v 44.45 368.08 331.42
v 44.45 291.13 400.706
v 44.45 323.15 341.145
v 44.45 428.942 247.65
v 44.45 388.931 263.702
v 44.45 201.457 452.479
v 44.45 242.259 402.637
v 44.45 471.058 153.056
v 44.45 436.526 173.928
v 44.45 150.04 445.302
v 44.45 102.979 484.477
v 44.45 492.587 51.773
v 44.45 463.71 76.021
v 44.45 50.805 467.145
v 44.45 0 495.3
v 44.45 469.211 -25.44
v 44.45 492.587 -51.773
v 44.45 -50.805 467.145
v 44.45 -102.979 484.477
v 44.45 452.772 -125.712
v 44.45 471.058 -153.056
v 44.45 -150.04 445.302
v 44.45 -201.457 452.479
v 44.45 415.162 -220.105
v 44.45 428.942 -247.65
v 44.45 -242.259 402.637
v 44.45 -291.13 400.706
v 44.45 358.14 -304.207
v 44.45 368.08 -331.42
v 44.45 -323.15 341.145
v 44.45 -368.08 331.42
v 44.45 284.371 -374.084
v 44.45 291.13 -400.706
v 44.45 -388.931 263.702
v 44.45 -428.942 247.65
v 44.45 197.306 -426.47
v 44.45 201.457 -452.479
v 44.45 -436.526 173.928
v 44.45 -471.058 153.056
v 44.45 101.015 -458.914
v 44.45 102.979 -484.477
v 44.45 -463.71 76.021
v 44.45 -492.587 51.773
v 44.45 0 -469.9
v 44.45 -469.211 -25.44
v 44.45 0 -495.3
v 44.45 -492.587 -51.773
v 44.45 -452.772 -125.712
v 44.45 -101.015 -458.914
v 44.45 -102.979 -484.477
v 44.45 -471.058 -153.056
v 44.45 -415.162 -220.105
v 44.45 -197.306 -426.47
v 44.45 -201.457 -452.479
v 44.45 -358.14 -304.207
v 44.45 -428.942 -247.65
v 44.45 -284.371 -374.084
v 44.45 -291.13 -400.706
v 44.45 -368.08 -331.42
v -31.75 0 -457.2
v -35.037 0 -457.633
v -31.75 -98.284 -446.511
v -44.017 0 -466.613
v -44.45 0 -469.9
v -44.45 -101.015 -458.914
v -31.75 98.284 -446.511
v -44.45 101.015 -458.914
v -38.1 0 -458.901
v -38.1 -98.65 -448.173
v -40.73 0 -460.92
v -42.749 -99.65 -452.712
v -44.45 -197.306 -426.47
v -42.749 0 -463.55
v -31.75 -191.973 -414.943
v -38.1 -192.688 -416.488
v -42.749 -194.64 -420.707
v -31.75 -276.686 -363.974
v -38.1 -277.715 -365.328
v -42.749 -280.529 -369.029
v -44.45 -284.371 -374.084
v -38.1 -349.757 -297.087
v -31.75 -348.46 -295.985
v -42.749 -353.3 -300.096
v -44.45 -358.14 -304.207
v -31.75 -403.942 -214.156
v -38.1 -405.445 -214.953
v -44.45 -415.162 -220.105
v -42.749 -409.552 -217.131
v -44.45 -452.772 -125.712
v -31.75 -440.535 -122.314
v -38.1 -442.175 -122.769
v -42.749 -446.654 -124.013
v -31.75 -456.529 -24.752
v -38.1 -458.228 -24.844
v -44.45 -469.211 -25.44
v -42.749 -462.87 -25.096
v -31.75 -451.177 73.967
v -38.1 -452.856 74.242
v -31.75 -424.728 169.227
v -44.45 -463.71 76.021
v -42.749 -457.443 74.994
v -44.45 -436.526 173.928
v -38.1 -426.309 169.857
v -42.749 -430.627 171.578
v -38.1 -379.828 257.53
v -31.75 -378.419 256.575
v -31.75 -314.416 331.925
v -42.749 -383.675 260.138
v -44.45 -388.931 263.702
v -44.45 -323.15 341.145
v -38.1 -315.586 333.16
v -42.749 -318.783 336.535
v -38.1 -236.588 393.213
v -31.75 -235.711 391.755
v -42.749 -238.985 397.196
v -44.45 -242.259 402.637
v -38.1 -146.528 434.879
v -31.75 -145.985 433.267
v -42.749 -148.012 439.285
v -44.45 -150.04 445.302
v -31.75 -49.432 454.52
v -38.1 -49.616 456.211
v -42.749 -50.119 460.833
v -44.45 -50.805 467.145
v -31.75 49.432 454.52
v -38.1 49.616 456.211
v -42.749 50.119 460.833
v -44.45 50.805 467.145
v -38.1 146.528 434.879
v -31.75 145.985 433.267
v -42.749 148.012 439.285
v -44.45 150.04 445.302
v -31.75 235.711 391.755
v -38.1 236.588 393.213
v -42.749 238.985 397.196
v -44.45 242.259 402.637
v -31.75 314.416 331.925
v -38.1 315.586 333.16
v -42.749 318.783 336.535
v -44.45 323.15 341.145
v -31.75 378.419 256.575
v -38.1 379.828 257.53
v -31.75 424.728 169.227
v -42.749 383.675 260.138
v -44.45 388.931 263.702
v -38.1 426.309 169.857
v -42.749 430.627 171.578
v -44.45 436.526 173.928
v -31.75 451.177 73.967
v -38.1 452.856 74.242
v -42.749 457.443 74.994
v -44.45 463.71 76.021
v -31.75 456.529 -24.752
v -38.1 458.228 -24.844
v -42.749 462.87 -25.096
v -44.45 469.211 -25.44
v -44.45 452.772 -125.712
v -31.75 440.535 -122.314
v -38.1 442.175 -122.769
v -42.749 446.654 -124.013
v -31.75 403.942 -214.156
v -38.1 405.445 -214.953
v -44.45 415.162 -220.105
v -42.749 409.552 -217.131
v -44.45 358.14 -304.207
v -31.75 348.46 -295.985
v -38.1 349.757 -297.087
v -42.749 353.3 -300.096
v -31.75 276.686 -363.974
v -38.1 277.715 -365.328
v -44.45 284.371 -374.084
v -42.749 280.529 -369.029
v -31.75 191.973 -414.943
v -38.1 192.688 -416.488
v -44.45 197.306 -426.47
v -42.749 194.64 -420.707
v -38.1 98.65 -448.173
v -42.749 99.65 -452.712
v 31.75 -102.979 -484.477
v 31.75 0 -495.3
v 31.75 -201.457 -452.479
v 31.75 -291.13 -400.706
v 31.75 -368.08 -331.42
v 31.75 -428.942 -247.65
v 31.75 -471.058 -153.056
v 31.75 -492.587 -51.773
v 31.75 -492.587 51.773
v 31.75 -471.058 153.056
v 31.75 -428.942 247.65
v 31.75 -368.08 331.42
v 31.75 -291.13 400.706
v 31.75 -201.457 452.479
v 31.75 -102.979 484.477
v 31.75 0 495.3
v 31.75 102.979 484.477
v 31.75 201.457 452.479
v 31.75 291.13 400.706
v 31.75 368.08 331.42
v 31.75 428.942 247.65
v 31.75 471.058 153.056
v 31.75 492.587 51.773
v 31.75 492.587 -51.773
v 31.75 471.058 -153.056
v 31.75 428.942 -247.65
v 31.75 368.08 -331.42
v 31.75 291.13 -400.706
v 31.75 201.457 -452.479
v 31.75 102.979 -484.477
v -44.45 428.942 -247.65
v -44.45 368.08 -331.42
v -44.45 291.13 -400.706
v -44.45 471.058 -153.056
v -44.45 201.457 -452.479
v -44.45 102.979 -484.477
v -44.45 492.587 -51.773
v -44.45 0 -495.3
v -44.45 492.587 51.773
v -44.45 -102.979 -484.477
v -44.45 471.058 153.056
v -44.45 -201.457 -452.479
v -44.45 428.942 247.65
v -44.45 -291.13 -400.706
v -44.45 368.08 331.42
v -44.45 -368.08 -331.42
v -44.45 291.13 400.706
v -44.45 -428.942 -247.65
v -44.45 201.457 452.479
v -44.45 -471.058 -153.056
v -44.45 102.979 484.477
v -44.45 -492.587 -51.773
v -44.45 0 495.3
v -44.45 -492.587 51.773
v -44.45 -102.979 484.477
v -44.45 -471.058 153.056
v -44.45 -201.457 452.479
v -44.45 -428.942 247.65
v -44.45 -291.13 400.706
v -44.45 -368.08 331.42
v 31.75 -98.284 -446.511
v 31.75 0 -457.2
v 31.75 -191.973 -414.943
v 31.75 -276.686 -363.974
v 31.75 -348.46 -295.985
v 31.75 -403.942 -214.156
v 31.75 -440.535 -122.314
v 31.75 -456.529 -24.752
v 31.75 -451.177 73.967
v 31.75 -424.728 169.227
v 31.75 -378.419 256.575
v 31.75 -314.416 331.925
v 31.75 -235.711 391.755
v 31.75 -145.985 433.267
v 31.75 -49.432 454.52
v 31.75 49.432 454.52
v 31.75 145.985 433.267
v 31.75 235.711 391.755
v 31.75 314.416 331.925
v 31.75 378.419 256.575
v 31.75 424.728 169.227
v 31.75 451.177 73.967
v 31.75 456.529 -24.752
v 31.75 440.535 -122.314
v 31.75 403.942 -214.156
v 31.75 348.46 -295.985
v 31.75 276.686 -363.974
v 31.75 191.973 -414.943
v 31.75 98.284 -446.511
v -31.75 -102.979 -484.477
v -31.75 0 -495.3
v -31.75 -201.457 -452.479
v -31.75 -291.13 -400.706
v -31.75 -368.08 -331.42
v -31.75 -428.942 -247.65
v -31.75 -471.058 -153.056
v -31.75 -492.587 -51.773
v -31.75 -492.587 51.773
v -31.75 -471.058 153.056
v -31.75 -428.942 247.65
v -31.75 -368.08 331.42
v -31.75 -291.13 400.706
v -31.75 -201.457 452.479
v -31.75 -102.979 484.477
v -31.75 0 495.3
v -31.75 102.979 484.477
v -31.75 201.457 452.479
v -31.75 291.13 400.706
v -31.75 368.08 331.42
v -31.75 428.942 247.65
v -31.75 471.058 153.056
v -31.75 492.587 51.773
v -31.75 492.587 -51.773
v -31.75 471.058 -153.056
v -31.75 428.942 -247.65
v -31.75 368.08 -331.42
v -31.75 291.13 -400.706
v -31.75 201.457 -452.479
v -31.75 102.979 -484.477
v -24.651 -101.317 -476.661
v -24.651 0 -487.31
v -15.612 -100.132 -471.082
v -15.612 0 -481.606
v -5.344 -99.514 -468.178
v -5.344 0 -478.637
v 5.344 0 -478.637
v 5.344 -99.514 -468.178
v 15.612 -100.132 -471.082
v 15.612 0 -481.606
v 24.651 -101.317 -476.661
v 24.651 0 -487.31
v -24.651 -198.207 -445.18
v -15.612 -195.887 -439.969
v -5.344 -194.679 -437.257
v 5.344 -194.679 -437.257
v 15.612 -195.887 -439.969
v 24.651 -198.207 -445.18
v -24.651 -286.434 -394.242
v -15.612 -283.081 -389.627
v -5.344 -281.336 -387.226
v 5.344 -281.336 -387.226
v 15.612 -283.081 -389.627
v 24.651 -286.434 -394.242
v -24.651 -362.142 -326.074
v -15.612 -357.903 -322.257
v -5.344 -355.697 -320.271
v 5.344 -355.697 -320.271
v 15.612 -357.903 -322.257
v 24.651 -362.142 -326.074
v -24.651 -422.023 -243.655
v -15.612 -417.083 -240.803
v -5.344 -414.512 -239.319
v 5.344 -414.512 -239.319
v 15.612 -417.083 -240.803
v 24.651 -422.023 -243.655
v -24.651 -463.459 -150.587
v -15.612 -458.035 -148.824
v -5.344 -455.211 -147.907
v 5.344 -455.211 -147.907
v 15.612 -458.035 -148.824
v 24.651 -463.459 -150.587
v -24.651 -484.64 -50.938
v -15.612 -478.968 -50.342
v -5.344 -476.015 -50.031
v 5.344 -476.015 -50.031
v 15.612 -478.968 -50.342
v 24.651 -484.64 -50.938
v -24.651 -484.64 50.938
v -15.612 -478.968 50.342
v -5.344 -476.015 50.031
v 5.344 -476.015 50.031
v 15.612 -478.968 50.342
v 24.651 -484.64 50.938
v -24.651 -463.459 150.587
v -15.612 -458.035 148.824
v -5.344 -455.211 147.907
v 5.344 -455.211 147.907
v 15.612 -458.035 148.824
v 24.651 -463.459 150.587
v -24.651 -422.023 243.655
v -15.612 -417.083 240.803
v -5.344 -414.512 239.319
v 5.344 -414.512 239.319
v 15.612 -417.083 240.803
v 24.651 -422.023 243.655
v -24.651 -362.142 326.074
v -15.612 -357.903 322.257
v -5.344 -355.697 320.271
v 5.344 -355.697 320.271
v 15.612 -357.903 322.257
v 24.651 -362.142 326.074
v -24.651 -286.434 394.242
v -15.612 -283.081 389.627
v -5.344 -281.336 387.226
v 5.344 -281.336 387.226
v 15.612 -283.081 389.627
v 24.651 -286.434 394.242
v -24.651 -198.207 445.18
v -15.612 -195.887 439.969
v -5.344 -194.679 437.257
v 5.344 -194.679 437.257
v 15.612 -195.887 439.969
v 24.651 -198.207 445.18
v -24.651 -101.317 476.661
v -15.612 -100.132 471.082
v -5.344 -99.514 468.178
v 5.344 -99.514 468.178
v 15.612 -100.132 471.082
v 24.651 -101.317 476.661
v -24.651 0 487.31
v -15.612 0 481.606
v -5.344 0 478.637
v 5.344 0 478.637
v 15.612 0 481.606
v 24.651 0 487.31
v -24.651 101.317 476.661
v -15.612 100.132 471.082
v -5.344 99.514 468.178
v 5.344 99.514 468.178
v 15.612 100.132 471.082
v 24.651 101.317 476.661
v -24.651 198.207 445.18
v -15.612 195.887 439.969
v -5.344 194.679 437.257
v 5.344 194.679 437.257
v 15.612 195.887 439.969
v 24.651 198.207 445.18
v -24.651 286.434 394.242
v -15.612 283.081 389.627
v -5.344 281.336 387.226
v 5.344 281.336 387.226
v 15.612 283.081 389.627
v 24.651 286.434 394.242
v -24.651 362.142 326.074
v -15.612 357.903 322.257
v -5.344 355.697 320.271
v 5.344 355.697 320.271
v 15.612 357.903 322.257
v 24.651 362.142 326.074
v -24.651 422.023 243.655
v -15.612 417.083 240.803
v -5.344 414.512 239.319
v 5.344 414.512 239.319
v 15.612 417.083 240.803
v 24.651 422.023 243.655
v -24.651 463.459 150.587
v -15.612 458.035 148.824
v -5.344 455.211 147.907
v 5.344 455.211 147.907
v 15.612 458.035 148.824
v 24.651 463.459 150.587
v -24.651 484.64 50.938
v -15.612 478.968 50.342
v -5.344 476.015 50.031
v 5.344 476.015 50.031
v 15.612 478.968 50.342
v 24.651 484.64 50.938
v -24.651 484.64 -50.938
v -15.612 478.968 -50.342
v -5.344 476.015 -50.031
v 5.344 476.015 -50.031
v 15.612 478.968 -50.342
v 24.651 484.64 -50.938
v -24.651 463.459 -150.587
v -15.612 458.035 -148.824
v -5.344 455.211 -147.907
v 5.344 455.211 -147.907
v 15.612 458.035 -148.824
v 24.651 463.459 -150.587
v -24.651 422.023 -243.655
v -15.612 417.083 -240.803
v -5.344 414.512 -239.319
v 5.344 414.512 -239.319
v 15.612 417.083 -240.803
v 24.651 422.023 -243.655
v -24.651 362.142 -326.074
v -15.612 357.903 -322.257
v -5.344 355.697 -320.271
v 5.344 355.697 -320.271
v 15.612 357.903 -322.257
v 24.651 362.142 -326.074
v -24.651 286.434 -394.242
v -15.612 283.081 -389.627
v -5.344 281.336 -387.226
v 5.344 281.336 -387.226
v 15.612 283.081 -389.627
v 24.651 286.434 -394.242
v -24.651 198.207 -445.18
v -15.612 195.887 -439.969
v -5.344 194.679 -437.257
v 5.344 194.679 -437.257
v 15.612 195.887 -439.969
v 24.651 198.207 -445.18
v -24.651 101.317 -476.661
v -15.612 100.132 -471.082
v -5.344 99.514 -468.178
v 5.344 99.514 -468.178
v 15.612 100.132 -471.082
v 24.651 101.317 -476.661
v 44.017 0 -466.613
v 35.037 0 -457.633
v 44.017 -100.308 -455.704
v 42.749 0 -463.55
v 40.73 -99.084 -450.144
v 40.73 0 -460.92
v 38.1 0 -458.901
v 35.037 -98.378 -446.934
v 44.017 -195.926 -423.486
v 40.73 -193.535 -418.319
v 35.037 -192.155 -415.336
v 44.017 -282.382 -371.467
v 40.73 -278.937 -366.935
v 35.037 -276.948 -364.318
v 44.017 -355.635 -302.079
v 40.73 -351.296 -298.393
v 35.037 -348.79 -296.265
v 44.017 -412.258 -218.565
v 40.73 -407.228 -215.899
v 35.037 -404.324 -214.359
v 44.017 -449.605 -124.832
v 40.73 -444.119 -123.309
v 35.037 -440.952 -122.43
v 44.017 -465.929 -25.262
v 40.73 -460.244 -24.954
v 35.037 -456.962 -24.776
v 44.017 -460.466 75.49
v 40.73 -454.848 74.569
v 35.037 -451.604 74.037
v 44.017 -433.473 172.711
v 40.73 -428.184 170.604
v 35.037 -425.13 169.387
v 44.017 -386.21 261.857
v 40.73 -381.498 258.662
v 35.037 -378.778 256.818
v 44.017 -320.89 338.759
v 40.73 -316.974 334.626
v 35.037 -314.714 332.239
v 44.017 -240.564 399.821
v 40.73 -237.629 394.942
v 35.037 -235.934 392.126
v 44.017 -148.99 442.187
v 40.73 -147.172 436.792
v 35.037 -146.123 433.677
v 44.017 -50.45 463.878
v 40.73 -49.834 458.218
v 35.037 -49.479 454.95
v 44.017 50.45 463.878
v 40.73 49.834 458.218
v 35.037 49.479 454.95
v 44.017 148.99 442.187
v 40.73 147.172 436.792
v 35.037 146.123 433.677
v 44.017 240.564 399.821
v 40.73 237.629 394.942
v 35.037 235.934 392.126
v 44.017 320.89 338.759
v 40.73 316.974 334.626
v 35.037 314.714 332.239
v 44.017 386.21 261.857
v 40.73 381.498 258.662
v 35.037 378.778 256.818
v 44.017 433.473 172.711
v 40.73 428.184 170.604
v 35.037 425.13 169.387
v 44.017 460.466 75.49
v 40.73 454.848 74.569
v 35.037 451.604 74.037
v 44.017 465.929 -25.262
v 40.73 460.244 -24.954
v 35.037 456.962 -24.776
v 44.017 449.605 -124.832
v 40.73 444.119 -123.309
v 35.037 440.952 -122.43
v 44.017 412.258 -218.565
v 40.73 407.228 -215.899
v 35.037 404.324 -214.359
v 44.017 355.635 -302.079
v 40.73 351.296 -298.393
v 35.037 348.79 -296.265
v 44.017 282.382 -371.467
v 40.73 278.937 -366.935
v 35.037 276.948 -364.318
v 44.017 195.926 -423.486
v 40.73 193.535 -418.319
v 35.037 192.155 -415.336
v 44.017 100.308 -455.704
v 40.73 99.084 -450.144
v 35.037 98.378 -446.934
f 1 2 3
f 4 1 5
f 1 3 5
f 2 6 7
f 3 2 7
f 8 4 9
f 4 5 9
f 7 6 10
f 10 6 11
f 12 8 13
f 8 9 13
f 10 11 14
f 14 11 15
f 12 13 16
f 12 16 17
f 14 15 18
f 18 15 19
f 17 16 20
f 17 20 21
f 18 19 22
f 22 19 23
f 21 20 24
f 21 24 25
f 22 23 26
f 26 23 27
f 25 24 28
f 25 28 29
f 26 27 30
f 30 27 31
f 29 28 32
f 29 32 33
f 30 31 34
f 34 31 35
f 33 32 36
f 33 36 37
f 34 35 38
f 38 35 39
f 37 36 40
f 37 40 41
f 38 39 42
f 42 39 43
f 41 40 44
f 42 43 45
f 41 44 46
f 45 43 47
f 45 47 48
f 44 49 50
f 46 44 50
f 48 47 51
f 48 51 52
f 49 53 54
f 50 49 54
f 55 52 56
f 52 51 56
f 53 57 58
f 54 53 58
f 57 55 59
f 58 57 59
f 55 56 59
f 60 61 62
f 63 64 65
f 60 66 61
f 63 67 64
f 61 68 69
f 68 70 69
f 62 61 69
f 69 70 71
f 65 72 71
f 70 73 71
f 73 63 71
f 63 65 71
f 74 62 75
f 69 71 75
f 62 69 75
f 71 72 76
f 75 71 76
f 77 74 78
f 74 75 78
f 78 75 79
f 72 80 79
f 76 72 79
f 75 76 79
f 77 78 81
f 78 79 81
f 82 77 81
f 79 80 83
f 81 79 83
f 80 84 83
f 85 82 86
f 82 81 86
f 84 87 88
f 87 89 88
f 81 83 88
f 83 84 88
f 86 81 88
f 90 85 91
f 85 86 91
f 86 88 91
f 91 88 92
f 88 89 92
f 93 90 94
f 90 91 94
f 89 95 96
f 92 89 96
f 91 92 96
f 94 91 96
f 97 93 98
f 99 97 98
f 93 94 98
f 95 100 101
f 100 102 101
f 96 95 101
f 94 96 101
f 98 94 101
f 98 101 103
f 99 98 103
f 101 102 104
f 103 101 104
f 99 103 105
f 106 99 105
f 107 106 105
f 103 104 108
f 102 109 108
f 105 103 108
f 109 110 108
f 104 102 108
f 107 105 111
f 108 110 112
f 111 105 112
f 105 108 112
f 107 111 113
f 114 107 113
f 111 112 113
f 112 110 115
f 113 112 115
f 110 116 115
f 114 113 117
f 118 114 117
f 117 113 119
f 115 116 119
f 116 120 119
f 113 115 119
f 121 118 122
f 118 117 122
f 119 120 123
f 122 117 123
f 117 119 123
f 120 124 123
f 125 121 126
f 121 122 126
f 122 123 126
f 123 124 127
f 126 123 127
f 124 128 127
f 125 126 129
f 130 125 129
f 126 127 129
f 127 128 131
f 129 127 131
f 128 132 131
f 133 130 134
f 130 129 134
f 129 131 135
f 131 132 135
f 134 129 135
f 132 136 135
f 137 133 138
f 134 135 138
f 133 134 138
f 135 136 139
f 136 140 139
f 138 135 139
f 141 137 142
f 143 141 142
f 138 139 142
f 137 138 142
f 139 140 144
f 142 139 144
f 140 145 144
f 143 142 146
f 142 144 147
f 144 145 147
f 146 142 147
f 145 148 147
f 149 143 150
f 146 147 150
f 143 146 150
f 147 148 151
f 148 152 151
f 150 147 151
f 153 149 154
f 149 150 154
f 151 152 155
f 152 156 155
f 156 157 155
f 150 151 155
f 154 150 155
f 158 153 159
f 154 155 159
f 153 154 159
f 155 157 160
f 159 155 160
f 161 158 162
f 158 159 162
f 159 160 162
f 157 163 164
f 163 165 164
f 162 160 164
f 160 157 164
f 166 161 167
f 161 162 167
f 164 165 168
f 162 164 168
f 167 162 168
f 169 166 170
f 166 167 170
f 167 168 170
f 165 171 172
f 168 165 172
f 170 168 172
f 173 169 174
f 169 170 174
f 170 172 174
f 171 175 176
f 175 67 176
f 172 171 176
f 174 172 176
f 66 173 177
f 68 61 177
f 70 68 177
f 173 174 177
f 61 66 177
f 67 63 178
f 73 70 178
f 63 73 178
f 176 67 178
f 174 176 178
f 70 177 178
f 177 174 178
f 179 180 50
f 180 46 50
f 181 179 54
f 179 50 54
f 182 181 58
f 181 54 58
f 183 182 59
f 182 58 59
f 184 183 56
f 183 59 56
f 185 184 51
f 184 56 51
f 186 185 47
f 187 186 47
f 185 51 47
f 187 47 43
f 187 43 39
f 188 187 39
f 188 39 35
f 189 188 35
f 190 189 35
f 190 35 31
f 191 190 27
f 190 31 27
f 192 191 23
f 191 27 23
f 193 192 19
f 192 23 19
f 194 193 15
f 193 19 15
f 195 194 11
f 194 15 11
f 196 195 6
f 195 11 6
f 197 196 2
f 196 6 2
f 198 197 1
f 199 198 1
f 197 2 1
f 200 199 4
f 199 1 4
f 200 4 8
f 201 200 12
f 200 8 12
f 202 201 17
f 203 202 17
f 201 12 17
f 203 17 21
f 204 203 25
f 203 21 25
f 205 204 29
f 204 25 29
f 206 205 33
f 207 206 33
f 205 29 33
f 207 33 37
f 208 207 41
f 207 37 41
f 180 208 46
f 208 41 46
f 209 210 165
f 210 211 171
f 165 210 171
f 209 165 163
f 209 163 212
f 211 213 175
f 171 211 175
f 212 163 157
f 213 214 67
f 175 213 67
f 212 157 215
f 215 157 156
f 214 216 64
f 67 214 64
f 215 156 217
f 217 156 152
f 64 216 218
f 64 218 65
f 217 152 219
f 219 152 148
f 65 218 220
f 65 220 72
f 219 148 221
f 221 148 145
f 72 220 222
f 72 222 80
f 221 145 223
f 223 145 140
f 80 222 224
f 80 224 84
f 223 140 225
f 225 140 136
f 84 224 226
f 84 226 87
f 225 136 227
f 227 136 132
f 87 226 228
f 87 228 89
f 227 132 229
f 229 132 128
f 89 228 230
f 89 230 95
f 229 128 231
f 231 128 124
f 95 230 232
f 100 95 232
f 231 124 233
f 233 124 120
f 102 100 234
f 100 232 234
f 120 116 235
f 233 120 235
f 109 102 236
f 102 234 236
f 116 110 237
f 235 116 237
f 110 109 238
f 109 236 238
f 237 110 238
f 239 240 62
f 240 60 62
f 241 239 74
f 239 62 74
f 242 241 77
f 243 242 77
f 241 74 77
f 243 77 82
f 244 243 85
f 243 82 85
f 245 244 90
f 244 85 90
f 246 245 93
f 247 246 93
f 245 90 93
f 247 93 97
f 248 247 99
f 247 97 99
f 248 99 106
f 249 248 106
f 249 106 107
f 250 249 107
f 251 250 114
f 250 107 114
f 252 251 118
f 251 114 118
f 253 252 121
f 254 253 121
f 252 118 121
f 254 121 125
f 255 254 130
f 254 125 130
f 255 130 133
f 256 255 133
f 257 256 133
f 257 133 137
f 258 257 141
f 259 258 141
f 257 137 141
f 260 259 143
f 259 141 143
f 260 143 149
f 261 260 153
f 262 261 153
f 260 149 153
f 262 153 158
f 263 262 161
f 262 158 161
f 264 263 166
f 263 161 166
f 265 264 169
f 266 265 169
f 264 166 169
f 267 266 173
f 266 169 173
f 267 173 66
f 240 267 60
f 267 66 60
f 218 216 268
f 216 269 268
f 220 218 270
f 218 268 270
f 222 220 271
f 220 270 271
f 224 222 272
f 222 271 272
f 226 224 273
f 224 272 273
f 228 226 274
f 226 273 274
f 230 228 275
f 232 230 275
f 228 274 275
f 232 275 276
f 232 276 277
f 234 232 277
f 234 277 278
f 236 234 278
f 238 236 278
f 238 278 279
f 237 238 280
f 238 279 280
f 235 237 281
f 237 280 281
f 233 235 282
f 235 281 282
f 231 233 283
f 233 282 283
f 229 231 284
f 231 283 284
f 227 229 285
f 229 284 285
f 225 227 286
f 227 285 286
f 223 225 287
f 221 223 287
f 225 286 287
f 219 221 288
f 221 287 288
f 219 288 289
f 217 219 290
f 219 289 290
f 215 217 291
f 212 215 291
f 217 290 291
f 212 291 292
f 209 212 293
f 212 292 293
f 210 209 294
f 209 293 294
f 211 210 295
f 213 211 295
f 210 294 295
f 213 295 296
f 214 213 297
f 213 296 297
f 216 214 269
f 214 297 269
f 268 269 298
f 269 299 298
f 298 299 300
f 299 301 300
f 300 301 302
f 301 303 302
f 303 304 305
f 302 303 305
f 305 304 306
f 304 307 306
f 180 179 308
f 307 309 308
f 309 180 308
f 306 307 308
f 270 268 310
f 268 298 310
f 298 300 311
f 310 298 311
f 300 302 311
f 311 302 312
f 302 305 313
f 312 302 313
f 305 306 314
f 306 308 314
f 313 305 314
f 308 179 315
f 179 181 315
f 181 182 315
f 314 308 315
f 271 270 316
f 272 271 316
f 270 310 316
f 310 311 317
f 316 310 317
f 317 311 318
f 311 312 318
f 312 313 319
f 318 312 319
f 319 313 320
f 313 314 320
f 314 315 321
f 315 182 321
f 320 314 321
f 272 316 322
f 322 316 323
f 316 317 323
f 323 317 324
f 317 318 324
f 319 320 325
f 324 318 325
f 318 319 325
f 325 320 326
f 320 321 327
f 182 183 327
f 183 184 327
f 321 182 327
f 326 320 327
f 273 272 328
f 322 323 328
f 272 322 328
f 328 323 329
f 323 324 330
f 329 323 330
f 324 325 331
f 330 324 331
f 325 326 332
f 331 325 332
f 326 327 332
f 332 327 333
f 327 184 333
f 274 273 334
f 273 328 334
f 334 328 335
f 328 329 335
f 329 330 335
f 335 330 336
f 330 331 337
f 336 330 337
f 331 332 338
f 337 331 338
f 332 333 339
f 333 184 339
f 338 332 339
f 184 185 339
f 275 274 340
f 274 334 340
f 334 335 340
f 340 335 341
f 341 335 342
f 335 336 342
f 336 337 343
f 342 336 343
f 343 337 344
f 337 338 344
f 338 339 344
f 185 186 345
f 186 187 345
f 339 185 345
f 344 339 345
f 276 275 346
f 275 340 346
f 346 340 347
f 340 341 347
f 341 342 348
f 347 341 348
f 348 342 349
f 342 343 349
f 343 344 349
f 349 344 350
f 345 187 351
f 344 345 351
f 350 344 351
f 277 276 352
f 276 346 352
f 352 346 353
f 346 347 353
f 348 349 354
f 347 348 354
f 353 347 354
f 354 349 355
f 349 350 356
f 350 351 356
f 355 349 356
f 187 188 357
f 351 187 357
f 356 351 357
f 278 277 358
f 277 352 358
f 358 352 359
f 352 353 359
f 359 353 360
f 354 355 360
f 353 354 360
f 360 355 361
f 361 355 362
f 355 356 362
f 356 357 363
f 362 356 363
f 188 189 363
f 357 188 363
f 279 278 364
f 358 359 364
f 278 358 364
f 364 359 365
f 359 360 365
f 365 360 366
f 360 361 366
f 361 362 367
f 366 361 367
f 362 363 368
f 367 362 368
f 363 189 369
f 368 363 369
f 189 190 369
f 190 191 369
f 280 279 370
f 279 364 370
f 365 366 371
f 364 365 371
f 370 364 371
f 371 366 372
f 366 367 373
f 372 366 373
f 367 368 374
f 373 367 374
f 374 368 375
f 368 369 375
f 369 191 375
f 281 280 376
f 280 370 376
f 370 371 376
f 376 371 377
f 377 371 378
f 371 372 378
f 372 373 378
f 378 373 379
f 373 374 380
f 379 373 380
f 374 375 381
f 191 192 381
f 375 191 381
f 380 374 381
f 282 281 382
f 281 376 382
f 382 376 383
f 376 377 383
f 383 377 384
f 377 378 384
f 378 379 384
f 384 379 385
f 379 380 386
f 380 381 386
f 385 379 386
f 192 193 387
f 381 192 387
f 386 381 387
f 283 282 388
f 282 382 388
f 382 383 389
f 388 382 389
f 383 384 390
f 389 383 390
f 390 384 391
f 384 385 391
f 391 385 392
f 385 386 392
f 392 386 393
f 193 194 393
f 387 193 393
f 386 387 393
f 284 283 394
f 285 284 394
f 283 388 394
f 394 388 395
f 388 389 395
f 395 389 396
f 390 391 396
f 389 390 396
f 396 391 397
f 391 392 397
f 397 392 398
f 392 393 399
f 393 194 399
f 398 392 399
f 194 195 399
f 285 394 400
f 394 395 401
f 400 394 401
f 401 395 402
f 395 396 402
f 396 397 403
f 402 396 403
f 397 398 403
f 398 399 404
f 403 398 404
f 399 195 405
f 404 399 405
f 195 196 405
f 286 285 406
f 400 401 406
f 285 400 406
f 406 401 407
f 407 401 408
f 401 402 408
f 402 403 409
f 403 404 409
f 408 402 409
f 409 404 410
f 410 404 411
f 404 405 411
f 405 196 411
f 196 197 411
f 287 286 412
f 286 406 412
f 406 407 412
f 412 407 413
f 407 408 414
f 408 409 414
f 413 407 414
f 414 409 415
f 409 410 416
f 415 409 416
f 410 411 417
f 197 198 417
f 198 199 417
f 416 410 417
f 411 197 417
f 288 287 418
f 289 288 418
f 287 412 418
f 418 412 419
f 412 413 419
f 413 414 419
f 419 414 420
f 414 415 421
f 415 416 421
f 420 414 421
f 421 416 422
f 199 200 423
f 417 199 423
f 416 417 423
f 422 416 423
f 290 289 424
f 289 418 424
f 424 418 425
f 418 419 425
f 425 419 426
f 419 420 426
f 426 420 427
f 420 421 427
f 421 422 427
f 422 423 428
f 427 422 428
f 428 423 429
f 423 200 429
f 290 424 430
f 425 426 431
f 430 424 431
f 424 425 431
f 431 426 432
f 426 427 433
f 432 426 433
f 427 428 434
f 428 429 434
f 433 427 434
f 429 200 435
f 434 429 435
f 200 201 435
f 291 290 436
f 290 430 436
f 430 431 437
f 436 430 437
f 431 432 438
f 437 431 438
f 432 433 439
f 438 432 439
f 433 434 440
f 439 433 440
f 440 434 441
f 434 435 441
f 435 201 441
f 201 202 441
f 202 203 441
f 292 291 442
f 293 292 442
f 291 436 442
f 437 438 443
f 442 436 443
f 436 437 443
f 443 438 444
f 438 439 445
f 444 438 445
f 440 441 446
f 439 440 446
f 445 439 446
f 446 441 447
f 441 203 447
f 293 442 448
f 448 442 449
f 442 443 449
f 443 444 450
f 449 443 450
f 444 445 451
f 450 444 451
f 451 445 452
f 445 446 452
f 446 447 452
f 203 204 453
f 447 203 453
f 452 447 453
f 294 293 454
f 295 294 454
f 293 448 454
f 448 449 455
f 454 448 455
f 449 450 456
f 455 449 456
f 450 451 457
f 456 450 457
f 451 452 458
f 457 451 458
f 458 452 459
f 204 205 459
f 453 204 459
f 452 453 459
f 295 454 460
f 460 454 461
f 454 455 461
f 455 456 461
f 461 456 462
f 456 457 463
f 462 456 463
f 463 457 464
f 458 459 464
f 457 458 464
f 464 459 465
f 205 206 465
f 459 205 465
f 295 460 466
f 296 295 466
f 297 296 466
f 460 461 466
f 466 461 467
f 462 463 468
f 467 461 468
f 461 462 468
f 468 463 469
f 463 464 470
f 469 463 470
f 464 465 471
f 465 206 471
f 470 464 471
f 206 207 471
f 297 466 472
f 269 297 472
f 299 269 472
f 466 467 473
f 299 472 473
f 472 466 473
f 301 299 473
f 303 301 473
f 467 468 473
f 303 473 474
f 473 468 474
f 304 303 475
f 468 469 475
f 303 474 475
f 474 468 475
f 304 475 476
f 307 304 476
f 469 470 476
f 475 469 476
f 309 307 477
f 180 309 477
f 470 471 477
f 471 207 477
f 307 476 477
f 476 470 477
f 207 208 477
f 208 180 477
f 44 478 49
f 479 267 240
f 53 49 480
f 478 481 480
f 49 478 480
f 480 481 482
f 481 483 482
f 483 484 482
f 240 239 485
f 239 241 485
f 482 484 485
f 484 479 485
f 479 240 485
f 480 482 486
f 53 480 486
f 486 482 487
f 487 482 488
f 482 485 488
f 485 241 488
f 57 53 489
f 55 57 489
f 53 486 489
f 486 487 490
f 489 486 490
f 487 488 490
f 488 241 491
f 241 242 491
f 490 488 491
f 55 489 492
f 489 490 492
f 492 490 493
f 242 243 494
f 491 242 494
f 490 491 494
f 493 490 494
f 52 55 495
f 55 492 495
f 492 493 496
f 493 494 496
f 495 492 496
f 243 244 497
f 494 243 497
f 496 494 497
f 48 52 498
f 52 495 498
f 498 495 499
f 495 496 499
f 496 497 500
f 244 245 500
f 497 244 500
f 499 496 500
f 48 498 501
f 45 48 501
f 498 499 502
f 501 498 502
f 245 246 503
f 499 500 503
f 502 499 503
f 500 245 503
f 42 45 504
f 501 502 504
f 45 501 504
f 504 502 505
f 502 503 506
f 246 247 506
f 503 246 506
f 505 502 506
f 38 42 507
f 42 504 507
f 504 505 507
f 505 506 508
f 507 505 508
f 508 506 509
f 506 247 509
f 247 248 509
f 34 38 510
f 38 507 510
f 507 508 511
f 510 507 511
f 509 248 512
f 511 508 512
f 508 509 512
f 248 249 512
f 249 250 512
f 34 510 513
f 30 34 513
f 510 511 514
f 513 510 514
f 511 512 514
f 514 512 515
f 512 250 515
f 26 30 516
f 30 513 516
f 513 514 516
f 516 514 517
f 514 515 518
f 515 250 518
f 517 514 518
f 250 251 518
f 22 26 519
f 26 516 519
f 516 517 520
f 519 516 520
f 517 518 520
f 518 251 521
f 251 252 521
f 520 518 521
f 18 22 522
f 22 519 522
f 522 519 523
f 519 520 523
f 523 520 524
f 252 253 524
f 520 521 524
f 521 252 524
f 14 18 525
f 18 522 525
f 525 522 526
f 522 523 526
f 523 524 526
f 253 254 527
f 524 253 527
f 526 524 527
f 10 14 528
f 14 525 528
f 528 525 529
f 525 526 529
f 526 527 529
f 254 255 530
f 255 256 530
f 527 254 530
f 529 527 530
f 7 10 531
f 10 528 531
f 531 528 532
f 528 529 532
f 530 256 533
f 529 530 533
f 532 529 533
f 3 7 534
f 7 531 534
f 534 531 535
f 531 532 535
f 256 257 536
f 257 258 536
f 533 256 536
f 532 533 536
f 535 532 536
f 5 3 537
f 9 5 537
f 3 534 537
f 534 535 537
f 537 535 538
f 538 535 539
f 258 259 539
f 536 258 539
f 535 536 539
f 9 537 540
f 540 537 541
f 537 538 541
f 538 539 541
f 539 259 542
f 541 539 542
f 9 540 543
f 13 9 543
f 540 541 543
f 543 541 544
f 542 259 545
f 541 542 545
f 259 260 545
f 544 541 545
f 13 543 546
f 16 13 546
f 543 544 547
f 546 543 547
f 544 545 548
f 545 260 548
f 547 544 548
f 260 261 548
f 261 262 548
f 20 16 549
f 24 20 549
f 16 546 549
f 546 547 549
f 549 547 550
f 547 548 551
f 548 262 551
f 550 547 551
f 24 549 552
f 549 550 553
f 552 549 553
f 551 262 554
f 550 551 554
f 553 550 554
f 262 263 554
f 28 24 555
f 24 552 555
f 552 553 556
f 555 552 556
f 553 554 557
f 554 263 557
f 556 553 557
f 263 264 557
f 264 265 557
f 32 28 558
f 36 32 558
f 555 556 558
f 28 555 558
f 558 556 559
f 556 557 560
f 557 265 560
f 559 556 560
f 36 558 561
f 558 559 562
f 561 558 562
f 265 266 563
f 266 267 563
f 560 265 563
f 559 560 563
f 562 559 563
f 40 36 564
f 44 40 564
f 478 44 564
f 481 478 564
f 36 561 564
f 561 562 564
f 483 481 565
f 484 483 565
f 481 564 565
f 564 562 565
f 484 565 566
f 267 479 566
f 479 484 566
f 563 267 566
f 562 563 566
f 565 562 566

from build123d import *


with BuildPart() as part:
    # Sketch1 → Revolve3 (revolve)
    with BuildSketch(Plane.XY, mode=Mode.PRIVATE) as revolve3_sk:
        with BuildLine():
            Line((31.75, 495.3), (44.45, 495.3))
            Line((44.45, 495.3), (44.45, 469.9))
            ThreePointArc((44.45, 469.9), (40.730256121, 460.919743879), (31.75, 457.2))
            Line((31.75, 457.2), (-31.75, 457.2))
            ThreePointArc((-31.75, 457.2), (-40.730256121, 460.919743879), (-44.45, 469.9))
            Line((-44.45, 469.9), (-44.45, 495.3))
            Line((-44.45, 495.3), (-31.75, 495.3))
            ThreePointArc((-31.75, 495.3), (0, 478.260567419), (31.75, 495.3))
        make_face()
    revolve(revolve3_sk.sketch.rotate(Axis((0, 0, 0), (-1, 0, 0)), 90), axis=Axis((0, 0, 0), (-1, 0, 0)))


solid = part.part
